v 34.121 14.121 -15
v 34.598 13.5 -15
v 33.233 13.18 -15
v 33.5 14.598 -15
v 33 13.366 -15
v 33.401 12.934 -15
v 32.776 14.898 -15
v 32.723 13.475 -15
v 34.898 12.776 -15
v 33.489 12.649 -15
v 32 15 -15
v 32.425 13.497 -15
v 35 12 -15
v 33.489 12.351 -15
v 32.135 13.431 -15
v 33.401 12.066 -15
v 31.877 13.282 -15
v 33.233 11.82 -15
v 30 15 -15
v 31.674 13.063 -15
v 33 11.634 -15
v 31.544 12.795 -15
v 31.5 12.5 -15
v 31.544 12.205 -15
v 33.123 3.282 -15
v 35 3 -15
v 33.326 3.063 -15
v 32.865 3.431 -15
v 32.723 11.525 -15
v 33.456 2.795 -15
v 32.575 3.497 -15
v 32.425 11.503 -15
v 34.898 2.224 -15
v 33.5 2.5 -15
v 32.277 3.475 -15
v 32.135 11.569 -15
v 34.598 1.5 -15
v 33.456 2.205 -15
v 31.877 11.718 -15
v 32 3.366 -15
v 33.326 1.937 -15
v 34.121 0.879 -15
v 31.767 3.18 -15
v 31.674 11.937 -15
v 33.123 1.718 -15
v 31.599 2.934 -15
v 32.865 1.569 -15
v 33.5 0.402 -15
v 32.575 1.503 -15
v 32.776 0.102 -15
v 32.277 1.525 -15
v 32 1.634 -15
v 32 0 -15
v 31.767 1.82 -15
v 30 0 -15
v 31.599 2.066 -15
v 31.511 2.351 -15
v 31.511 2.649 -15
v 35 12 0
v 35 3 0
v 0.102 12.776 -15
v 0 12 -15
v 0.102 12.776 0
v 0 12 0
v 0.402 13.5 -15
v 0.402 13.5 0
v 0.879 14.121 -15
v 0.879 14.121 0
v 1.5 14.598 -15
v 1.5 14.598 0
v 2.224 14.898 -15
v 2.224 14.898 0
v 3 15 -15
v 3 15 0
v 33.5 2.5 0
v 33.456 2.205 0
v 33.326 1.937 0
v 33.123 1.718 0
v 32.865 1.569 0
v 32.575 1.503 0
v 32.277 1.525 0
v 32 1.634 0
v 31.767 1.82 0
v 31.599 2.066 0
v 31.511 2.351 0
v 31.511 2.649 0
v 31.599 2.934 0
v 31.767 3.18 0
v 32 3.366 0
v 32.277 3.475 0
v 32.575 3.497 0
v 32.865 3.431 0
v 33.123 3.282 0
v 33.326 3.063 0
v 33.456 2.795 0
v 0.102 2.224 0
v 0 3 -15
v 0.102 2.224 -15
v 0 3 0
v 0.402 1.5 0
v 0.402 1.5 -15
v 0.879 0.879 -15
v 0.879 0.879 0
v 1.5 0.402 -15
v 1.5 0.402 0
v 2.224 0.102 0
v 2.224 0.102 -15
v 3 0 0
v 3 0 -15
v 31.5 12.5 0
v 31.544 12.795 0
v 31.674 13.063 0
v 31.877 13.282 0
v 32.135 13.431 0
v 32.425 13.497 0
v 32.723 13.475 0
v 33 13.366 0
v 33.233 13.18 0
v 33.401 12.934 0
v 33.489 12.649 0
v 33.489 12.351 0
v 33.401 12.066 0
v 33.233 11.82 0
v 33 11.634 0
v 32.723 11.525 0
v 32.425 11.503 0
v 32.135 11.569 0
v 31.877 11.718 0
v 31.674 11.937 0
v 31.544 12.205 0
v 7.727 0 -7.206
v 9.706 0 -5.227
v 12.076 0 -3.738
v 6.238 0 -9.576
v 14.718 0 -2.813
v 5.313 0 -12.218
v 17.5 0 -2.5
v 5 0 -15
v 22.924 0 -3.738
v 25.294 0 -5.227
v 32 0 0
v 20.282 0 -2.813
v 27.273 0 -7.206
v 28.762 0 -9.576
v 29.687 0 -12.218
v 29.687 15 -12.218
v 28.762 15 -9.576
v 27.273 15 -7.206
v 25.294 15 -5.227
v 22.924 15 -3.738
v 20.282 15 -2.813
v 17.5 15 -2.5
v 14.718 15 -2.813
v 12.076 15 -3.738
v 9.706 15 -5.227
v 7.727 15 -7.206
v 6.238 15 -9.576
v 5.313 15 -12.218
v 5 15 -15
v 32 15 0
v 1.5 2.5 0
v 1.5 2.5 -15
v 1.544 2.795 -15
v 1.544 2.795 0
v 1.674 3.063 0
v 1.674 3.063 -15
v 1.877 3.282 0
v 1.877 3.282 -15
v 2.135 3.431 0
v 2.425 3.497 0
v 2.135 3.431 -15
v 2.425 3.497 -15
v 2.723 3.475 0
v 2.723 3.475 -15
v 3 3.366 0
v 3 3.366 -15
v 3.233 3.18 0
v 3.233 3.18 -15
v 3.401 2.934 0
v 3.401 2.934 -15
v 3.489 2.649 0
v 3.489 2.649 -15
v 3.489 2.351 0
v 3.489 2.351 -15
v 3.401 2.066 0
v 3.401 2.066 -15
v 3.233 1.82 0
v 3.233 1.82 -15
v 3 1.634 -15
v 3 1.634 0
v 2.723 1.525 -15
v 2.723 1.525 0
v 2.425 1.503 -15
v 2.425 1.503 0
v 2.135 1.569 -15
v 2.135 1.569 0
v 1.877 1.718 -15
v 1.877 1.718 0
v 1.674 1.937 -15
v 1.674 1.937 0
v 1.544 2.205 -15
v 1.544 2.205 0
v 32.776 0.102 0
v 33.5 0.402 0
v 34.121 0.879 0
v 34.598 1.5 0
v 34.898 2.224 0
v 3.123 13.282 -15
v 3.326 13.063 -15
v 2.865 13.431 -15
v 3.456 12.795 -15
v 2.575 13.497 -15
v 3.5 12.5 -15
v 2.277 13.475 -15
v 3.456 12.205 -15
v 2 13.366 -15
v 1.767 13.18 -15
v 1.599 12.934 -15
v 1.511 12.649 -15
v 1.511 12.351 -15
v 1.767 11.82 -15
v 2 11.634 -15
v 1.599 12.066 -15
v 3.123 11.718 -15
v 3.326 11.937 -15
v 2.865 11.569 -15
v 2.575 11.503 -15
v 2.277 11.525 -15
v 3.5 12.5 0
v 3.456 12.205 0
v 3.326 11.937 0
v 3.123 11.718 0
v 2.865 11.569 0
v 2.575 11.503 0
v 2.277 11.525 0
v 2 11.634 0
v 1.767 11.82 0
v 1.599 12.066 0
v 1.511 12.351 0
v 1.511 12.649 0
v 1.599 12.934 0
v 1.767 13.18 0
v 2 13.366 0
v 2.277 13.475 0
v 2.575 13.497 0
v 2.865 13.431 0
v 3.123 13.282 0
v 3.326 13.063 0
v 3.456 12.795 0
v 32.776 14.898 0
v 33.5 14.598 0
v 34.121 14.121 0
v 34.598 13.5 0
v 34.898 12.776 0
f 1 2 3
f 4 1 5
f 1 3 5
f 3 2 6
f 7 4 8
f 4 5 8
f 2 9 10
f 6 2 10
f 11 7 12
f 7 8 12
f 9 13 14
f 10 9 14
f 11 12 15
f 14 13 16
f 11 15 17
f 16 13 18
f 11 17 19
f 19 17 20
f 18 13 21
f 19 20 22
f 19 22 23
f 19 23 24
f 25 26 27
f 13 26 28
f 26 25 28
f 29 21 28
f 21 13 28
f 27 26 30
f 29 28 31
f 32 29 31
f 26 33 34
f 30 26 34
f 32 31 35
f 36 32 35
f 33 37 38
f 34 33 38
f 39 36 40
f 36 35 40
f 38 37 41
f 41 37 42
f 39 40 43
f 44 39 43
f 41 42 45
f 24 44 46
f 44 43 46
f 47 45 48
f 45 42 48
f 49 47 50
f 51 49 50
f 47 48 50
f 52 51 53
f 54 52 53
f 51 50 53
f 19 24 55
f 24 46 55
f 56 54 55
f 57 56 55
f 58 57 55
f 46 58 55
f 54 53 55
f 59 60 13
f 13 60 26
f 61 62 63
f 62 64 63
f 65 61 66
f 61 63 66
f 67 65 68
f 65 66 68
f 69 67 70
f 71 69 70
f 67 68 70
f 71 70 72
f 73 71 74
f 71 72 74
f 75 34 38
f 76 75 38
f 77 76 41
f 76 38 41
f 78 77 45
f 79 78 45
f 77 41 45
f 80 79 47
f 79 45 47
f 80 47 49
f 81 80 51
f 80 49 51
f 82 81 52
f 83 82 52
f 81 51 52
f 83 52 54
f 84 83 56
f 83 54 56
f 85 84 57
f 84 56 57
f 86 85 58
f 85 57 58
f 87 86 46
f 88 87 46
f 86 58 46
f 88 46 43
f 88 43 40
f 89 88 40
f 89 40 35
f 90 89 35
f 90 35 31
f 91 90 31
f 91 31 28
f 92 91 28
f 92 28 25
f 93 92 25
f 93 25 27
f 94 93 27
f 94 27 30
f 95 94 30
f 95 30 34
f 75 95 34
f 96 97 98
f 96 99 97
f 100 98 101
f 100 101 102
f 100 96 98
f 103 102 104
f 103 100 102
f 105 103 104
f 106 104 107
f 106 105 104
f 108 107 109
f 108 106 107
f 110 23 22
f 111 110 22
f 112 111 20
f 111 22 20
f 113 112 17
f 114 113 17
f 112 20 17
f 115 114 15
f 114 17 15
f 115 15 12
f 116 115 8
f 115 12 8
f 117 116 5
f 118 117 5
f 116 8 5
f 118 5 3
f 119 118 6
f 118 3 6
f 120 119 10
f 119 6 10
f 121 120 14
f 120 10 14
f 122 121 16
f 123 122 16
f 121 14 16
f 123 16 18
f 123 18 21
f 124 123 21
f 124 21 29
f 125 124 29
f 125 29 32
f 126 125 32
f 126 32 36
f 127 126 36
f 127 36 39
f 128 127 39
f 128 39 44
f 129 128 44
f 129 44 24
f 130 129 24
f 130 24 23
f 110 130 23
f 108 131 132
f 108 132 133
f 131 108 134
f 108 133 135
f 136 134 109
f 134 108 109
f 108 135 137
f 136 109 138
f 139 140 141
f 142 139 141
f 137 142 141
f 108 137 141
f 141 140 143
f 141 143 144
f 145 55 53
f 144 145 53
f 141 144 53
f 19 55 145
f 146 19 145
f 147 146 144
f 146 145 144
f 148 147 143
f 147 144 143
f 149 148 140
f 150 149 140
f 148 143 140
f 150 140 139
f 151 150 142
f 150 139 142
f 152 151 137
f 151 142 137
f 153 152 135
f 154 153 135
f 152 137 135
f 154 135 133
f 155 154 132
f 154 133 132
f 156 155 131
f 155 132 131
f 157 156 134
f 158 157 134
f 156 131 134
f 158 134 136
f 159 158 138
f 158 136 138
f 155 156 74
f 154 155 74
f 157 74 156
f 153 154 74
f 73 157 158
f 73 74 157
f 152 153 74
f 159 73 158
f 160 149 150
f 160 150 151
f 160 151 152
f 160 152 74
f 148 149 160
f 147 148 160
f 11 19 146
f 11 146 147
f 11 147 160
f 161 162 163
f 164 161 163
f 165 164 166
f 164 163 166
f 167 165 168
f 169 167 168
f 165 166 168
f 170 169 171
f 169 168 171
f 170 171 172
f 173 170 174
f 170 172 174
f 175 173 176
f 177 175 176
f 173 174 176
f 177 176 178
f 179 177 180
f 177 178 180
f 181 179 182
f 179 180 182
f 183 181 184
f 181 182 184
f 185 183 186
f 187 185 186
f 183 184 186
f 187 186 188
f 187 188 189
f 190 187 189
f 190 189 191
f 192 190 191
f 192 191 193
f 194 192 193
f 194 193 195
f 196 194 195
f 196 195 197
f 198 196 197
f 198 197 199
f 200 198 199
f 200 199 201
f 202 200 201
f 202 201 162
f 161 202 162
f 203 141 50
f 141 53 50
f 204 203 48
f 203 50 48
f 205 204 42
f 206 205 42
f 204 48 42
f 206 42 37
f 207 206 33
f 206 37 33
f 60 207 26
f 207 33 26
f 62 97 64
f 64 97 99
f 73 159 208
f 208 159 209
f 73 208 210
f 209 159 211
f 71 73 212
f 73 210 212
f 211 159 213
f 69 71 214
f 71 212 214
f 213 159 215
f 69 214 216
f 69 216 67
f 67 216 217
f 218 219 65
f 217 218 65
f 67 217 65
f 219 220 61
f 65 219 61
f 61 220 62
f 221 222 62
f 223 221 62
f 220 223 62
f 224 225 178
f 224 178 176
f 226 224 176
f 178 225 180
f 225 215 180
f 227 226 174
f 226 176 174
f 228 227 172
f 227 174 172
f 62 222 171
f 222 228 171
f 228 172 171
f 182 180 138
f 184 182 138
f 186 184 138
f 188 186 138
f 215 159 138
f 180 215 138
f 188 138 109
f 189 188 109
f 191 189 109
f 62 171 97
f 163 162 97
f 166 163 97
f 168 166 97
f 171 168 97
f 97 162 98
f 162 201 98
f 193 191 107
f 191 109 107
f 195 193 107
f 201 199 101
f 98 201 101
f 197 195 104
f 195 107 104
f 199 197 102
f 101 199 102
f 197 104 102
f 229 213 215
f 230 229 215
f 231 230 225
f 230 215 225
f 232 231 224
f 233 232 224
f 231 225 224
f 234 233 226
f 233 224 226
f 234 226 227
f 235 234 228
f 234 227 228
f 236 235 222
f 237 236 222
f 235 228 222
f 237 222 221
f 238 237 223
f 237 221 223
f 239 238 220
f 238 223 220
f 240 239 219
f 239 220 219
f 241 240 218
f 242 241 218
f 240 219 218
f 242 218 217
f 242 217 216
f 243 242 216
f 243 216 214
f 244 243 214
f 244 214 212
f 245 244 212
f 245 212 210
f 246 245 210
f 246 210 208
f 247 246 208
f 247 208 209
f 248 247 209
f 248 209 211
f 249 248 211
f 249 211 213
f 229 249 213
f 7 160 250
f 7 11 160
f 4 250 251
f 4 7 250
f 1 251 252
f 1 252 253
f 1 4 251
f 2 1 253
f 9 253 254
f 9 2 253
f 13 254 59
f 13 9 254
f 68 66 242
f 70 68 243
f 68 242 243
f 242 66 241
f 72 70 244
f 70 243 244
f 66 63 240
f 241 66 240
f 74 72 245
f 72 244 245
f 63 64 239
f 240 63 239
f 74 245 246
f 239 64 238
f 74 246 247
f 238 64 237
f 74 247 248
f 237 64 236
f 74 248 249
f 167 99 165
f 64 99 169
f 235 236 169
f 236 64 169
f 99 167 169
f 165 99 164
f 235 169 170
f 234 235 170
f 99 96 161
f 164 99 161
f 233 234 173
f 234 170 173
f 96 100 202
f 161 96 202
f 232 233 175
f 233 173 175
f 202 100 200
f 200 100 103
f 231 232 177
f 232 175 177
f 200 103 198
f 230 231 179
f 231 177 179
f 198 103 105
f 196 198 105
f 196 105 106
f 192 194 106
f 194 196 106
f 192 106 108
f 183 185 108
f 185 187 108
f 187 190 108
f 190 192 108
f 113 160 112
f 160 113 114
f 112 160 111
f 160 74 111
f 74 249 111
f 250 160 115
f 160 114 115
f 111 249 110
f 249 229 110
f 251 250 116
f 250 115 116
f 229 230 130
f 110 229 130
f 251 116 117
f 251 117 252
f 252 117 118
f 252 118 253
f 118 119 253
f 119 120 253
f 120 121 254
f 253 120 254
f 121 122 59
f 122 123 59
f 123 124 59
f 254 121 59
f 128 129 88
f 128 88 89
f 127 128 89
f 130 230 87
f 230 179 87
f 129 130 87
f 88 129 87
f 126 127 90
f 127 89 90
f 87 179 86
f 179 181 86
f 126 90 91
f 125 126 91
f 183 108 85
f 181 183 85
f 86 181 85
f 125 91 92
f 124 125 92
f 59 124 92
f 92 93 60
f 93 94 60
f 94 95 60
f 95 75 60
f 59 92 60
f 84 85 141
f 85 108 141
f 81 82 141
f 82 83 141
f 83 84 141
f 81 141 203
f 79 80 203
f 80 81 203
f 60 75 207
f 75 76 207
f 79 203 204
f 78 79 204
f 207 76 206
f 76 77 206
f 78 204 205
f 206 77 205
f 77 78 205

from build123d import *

# Parameters (mm, degrees)
RESSALTO_EXTRUS_O1_DEPTH = 15
ESBO_O2_R                = 1
CORTE_EXTRUS_O1_DEPTH    = 41.926763859
FILETE1_R                = 3


with BuildPart() as part:
    # Esboço1 → Ressalto-extrusão1 (new body)
    with BuildSketch(Plane(origin=(0, 0, 0), x_dir=(1, 0, 0), z_dir=(0, 1, 0))):
        with BuildLine():
            Line((0, 15), (0, 0))
            Line((0, 0), (35, 0))
            Line((35, 0), (35, 15))
            Line((35, 15), (30, 15))
            ThreePointArc((30, 15), (17.5, 2.5), (5, 15))
            Line((5, 15), (0, 15))
        make_face()
    extrude(amount=RESSALTO_EXTRUS_O1_DEPTH)

    # Esboço2 → Corte-extrusão1 (cut, through all)
    with BuildSketch(Plane(origin=(0, 0, -15), x_dir=(-1, 0, 0), z_dir=(0, 0, -1))):
        with Locations((-32.5, 12.5)):
            Circle(ESBO_O2_R)
        with Locations((-32.5, 2.5)):
            Circle(ESBO_O2_R)
        with Locations((-2.5, 2.5)):
            Circle(ESBO_O2_R)
        with Locations((-2.5, 12.5)):
            Circle(ESBO_O2_R)
    extrude(amount=-CORTE_EXTRUS_O1_DEPTH, mode=Mode.SUBTRACT)

    # Filete1
    filete1_edges = [part.edges().sort_by_distance(p)[0] for p in [
        (0, 15, -7.5),
        (35, 15, -7.5),
        (0, 0, -7.5),
        (35, 0, -7.5),
    ]]
    fillet(filete1_edges, radius=FILETE1_R)


solid = part.part
